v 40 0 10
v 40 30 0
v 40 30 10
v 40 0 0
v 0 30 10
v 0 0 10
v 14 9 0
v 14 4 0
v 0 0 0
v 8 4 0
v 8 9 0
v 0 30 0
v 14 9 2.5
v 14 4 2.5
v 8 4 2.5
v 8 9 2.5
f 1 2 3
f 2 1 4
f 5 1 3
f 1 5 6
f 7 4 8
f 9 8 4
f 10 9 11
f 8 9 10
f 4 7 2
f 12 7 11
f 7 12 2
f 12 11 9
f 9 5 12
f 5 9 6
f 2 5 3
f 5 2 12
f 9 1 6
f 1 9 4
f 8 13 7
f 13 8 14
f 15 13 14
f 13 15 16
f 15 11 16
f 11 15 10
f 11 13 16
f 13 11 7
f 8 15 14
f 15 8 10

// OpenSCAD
// units=mm — generated by scad_emitter.py
// part=unnamed
$fn = 48;

difference() { cube([40, 30, 10]); translate([8, 4, -0.5]) cube([6, 5, 3]); }
